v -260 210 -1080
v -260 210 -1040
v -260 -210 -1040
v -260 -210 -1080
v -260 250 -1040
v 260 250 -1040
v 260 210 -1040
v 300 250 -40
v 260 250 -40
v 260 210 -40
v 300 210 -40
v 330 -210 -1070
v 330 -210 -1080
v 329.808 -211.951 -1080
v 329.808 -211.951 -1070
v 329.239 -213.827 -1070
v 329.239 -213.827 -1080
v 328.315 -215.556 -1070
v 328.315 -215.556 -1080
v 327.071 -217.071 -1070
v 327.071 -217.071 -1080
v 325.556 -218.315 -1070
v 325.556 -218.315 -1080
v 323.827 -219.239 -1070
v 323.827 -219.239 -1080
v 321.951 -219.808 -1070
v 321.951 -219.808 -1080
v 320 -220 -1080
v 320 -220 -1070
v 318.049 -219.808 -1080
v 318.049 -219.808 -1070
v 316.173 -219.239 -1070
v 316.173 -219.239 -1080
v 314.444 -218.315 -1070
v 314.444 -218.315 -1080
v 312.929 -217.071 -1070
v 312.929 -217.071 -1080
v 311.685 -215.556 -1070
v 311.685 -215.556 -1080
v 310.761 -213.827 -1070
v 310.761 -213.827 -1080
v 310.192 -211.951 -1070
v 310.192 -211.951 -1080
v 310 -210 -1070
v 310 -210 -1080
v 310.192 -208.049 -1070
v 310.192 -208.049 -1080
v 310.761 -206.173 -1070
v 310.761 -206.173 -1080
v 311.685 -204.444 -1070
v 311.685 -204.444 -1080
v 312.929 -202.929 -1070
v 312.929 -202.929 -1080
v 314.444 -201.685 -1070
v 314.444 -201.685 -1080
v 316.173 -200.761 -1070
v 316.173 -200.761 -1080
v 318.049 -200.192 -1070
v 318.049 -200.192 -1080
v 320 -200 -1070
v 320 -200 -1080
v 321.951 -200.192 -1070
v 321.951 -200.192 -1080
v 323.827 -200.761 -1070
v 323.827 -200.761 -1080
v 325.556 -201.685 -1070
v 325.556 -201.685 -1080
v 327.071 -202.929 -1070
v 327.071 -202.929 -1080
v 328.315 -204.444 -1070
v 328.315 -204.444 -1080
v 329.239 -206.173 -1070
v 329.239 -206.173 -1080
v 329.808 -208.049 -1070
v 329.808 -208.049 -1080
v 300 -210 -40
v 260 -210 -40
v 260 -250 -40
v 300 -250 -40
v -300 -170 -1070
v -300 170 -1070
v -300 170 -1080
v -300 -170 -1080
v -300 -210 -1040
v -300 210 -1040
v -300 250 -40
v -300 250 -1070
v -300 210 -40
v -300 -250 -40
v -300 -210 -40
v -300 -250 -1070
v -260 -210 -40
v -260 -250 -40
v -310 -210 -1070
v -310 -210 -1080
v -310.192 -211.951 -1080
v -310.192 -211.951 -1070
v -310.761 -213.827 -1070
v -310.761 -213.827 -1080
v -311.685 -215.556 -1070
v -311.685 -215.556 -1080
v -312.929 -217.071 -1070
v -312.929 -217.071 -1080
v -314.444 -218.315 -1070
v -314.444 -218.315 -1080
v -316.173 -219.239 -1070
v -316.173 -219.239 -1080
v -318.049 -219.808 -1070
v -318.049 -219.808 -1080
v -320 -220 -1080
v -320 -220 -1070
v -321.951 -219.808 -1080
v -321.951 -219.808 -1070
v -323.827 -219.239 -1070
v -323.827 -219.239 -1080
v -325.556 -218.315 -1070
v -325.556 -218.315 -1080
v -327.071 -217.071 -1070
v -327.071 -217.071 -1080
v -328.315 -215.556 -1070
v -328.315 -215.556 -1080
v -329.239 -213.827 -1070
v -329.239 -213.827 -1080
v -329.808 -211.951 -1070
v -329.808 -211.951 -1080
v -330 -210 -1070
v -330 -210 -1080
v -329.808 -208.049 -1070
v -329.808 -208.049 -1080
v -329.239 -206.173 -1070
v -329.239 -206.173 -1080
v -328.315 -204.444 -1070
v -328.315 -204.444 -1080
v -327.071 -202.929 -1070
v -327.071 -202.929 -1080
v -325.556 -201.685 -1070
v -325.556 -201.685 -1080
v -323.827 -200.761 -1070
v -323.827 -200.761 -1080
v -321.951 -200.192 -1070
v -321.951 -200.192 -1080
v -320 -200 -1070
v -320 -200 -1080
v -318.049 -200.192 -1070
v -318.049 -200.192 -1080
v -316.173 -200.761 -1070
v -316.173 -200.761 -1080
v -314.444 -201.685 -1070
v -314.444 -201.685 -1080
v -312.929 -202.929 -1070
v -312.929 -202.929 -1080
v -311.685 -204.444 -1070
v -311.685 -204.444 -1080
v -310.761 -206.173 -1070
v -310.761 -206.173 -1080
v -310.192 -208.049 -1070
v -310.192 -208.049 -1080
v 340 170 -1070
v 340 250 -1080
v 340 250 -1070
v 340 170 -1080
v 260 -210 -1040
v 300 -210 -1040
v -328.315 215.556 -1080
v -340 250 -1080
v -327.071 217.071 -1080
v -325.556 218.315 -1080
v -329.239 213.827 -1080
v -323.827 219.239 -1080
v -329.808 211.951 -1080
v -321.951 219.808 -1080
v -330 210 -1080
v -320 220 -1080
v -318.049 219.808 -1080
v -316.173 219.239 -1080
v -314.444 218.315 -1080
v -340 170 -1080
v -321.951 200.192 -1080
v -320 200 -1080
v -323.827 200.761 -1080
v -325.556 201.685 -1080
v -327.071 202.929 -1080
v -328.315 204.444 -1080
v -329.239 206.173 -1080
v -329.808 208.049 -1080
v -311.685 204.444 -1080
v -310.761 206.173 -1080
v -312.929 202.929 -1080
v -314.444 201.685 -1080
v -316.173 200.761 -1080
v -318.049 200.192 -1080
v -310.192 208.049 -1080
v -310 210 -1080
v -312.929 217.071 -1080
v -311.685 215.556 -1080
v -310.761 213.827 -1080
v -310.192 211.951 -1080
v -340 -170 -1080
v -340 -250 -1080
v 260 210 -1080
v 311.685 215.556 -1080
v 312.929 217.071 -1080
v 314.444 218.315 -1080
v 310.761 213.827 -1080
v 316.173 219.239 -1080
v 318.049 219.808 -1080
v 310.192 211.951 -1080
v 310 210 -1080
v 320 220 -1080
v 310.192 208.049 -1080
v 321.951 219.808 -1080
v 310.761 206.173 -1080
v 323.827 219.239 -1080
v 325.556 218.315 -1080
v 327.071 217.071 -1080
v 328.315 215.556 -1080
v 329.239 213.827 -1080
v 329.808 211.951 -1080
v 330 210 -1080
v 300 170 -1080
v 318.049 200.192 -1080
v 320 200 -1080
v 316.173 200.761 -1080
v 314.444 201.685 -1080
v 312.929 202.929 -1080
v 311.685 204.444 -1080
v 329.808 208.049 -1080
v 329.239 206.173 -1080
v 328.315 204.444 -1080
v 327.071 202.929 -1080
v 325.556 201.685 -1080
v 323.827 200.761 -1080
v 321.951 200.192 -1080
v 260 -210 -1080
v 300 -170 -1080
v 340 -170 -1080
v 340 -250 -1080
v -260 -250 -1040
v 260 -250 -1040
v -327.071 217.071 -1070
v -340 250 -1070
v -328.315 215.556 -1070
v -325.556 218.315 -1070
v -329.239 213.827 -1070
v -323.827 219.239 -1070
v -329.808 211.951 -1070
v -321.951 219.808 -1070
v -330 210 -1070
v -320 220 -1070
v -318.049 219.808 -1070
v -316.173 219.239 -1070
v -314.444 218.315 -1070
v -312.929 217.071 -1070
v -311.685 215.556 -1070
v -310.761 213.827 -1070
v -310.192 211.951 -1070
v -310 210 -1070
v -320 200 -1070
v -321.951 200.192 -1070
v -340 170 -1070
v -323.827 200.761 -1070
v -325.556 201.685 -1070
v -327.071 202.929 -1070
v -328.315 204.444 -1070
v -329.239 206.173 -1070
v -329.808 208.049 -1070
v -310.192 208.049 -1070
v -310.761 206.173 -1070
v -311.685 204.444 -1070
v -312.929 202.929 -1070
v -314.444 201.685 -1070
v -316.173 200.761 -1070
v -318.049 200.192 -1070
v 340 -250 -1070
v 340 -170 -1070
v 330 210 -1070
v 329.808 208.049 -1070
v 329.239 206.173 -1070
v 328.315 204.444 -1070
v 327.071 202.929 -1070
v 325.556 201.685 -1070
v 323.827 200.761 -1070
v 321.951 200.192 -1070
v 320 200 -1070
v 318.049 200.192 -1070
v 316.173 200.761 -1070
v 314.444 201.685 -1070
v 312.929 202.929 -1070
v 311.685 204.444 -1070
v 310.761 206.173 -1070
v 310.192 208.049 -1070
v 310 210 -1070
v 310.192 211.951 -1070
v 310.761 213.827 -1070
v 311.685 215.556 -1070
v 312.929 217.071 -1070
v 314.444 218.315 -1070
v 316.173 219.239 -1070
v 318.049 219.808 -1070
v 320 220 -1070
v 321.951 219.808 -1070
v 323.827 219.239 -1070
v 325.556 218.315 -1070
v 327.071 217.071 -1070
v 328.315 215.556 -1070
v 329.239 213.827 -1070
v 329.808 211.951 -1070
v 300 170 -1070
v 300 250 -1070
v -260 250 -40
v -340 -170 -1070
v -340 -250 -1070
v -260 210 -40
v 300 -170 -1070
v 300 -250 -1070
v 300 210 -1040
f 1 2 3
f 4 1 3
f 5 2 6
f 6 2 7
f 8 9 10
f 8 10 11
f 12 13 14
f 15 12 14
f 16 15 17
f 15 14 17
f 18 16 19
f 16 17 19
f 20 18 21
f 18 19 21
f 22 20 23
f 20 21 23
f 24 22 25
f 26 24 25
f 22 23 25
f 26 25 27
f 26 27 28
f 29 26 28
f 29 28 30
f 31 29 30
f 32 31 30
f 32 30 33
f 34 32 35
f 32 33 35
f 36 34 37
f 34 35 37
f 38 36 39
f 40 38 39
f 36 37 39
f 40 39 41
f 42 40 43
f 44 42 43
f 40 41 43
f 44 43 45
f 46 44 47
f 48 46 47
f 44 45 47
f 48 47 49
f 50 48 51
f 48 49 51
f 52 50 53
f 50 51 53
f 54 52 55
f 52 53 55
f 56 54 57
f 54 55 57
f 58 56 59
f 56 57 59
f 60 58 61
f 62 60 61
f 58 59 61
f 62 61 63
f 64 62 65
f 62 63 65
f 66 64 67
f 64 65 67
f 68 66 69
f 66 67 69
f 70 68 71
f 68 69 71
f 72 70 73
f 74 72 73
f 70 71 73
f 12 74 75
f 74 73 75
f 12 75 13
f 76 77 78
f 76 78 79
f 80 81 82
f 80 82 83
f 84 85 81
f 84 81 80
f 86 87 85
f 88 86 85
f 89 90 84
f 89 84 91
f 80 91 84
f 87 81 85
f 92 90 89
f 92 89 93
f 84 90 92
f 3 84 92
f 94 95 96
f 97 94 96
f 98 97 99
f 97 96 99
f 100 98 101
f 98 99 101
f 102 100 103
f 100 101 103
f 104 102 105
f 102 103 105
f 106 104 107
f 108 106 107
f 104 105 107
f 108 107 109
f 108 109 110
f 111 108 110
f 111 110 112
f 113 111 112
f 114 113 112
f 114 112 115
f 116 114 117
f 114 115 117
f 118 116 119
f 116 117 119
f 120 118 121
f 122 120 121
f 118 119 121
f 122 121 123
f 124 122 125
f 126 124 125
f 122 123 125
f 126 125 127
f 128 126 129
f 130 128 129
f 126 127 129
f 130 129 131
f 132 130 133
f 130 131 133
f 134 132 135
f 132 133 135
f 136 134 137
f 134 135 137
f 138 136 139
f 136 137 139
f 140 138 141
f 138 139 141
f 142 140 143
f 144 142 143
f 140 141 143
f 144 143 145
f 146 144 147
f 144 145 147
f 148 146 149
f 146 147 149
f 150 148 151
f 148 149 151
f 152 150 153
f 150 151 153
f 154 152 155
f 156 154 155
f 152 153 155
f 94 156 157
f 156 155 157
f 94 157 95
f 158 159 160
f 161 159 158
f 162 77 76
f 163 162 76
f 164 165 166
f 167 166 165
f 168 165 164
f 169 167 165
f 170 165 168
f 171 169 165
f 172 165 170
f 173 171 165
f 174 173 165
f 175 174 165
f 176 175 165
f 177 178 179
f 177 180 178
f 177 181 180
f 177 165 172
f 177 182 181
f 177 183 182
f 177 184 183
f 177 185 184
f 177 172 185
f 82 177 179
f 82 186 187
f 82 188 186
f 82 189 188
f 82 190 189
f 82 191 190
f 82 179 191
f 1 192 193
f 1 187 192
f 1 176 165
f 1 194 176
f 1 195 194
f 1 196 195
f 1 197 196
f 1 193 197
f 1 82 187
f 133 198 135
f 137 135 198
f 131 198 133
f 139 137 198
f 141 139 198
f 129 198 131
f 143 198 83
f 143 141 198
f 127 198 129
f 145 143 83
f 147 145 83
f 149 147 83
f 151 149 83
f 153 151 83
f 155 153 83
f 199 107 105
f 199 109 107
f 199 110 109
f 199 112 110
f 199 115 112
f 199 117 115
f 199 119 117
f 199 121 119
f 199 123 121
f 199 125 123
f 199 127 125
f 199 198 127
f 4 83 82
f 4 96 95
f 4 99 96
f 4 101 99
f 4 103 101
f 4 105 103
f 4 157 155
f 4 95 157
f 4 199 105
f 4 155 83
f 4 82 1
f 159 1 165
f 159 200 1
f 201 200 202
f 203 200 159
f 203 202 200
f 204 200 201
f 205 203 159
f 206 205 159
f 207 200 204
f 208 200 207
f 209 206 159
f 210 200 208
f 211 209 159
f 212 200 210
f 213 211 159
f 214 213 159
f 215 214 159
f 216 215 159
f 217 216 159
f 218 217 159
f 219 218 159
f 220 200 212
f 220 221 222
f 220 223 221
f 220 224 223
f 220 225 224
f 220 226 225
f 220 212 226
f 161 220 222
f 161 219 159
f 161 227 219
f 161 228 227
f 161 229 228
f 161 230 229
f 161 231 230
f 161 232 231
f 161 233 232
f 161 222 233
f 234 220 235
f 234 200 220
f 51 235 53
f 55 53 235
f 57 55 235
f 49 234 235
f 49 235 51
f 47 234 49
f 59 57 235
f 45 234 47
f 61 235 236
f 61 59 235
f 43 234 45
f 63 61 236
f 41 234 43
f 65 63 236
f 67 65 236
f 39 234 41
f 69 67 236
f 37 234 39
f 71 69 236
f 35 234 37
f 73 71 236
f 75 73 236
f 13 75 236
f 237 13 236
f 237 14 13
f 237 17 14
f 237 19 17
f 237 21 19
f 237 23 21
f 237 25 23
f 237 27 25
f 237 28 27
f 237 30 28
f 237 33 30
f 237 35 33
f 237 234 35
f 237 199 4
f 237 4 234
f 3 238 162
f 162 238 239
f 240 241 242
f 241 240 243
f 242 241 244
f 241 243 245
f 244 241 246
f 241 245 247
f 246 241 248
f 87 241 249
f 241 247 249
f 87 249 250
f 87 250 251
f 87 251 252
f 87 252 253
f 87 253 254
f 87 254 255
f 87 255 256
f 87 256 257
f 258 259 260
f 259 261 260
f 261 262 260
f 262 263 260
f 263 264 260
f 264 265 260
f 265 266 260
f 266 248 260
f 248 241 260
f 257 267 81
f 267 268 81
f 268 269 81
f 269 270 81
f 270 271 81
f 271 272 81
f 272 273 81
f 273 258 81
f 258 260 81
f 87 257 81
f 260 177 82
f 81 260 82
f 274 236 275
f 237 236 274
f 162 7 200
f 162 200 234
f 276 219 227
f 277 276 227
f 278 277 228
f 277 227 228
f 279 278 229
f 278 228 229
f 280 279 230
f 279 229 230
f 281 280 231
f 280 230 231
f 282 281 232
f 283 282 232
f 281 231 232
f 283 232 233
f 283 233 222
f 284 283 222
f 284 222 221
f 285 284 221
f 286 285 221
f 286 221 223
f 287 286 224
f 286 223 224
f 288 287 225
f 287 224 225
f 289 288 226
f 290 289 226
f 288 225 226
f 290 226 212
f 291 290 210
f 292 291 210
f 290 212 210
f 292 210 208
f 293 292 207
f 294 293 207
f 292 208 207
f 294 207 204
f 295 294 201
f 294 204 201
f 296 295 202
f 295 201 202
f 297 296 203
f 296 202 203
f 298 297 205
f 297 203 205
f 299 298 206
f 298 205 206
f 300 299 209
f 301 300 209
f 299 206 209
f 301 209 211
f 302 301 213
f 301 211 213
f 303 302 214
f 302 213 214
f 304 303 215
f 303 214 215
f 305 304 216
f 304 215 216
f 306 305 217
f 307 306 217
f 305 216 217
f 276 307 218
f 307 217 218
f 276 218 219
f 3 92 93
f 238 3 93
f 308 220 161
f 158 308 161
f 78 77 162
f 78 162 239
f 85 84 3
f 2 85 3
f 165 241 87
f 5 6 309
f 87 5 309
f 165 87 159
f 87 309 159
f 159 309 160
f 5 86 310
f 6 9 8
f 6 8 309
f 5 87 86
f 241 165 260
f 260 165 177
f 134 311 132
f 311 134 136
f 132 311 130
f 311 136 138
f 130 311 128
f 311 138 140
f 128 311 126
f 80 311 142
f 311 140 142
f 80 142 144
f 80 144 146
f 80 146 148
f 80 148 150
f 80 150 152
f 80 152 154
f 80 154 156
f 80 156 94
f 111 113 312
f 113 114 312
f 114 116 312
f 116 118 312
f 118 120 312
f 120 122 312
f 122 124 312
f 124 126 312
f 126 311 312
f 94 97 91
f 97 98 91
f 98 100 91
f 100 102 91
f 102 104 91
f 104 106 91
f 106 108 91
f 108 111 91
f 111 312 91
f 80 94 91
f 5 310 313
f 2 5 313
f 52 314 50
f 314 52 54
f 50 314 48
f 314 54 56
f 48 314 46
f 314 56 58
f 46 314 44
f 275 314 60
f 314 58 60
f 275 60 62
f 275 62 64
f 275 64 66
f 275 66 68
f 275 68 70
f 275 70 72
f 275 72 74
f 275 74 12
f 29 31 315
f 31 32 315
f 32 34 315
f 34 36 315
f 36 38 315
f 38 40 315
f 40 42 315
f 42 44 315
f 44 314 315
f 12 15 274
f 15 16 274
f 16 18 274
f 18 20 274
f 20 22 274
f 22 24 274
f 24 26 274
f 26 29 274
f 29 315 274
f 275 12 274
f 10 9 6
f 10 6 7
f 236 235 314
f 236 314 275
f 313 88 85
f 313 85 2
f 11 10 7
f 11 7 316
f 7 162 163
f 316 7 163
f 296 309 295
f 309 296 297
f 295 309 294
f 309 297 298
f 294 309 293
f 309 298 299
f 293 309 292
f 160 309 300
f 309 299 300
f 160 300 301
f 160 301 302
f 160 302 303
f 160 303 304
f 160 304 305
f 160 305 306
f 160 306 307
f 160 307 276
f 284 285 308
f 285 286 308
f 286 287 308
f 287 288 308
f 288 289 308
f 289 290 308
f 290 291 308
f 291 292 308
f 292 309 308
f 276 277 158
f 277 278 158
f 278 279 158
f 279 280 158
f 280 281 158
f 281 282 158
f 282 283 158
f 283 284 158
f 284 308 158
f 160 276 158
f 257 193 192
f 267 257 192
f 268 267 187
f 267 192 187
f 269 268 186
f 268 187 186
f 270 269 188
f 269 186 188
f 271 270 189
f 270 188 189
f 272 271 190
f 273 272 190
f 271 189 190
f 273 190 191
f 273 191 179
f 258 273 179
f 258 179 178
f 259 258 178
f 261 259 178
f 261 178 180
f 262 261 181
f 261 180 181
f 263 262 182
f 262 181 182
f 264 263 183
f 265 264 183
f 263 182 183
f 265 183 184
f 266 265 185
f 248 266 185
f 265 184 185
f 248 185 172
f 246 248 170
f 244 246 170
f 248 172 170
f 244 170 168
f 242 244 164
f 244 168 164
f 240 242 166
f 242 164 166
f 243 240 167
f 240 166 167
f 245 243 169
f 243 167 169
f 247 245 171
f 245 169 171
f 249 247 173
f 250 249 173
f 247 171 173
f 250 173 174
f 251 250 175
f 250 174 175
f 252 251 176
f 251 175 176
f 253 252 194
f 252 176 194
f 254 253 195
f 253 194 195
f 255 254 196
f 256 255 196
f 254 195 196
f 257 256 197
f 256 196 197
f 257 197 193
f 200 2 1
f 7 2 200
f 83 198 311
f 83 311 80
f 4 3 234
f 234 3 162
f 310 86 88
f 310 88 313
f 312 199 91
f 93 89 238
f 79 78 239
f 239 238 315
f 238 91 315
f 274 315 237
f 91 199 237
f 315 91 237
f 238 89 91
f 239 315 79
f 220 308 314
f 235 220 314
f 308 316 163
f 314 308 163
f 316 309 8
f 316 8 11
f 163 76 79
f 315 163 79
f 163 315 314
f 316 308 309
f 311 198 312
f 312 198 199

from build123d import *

# Parameters (mm, degrees)
F0_W     = 40
F0_H     = 500
F1_DEPTH = 40
F2_W     = 40
F2_H     = 40
F3_DEPTH = 1000
F4_W     = 600
F4_H     = 500
F4_W_2   = 520
F4_H_2   = 420
F5_DEPTH = 40
F6_W     = 40
F6_H     = 80
F6_R     = 10
F7_DEPTH = 10
F8_W     = 600
F8_H     = 500
F9_DEPTH = 40


with BuildPart() as f1:
    # F0 (on Top) → F1 (new body)
    with BuildSketch(Plane.XY):
        with Locations((280, 0)):
            Rectangle(F0_W, F0_H)
        with Locations((-280, 0)):
            Rectangle(F0_W, F0_H)
    extrude(amount=-F1_DEPTH)

    # F2 (on face) → F3 (join)
    with BuildSketch(Plane(origin=(0, 0, -40), x_dir=(1, 0, 0), z_dir=(0, 0, -1))):
        with Locations((280, -230)):
            Rectangle(F2_W, F2_H)
        with Locations((-280, -230)):
            Rectangle(F2_W, F2_H)
        with Locations((280, 230)):
            Rectangle(F2_W, F2_H)
        with Locations((-280, 230)):
            Rectangle(F2_W, F2_H)
    extrude(amount=F3_DEPTH)

    # F4 (on face) → F5 (join)
    with BuildSketch(Plane(origin=(0, 0, -1040), x_dir=(1, 0, 0), z_dir=(0, 0, -1))):
        Rectangle(F4_W, F4_H)
        Rectangle(F4_W_2, F4_H_2, mode=Mode.SUBTRACT)
    extrude(amount=F5_DEPTH)

    # F6 (on face) → F7 (join)
    with BuildSketch(Plane(origin=(0, 0, -1080), x_dir=(1, 0, 0), z_dir=(0, 0, -1))):
        with Locations((-320, 210)):
            Rectangle(F6_W, F6_H)
        with Locations((-320, 210)):
            Circle(F6_R, mode=Mode.SUBTRACT)
        with Locations((320, 210)):
            Rectangle(F6_W, F6_H)
        with Locations((320, 210)):
            Circle(F6_R, mode=Mode.SUBTRACT)
        with Locations((-320, -210)):
            Rectangle(F6_W, F6_H)
        with Locations((-320, -210)):
            Circle(F6_R, mode=Mode.SUBTRACT)
        with Locations((320, -210)):
            Rectangle(F6_W, F6_H)
        with Locations((320, -210)):
            Circle(F6_R, mode=Mode.SUBTRACT)
    extrude(amount=-F7_DEPTH)

    # F8 (on face) → F9 (cut)
    with BuildSketch(Plane.XY):
        Rectangle(F8_W, F8_H)
    extrude(amount=-F9_DEPTH, mode=Mode.SUBTRACT)


solid = f1.part
